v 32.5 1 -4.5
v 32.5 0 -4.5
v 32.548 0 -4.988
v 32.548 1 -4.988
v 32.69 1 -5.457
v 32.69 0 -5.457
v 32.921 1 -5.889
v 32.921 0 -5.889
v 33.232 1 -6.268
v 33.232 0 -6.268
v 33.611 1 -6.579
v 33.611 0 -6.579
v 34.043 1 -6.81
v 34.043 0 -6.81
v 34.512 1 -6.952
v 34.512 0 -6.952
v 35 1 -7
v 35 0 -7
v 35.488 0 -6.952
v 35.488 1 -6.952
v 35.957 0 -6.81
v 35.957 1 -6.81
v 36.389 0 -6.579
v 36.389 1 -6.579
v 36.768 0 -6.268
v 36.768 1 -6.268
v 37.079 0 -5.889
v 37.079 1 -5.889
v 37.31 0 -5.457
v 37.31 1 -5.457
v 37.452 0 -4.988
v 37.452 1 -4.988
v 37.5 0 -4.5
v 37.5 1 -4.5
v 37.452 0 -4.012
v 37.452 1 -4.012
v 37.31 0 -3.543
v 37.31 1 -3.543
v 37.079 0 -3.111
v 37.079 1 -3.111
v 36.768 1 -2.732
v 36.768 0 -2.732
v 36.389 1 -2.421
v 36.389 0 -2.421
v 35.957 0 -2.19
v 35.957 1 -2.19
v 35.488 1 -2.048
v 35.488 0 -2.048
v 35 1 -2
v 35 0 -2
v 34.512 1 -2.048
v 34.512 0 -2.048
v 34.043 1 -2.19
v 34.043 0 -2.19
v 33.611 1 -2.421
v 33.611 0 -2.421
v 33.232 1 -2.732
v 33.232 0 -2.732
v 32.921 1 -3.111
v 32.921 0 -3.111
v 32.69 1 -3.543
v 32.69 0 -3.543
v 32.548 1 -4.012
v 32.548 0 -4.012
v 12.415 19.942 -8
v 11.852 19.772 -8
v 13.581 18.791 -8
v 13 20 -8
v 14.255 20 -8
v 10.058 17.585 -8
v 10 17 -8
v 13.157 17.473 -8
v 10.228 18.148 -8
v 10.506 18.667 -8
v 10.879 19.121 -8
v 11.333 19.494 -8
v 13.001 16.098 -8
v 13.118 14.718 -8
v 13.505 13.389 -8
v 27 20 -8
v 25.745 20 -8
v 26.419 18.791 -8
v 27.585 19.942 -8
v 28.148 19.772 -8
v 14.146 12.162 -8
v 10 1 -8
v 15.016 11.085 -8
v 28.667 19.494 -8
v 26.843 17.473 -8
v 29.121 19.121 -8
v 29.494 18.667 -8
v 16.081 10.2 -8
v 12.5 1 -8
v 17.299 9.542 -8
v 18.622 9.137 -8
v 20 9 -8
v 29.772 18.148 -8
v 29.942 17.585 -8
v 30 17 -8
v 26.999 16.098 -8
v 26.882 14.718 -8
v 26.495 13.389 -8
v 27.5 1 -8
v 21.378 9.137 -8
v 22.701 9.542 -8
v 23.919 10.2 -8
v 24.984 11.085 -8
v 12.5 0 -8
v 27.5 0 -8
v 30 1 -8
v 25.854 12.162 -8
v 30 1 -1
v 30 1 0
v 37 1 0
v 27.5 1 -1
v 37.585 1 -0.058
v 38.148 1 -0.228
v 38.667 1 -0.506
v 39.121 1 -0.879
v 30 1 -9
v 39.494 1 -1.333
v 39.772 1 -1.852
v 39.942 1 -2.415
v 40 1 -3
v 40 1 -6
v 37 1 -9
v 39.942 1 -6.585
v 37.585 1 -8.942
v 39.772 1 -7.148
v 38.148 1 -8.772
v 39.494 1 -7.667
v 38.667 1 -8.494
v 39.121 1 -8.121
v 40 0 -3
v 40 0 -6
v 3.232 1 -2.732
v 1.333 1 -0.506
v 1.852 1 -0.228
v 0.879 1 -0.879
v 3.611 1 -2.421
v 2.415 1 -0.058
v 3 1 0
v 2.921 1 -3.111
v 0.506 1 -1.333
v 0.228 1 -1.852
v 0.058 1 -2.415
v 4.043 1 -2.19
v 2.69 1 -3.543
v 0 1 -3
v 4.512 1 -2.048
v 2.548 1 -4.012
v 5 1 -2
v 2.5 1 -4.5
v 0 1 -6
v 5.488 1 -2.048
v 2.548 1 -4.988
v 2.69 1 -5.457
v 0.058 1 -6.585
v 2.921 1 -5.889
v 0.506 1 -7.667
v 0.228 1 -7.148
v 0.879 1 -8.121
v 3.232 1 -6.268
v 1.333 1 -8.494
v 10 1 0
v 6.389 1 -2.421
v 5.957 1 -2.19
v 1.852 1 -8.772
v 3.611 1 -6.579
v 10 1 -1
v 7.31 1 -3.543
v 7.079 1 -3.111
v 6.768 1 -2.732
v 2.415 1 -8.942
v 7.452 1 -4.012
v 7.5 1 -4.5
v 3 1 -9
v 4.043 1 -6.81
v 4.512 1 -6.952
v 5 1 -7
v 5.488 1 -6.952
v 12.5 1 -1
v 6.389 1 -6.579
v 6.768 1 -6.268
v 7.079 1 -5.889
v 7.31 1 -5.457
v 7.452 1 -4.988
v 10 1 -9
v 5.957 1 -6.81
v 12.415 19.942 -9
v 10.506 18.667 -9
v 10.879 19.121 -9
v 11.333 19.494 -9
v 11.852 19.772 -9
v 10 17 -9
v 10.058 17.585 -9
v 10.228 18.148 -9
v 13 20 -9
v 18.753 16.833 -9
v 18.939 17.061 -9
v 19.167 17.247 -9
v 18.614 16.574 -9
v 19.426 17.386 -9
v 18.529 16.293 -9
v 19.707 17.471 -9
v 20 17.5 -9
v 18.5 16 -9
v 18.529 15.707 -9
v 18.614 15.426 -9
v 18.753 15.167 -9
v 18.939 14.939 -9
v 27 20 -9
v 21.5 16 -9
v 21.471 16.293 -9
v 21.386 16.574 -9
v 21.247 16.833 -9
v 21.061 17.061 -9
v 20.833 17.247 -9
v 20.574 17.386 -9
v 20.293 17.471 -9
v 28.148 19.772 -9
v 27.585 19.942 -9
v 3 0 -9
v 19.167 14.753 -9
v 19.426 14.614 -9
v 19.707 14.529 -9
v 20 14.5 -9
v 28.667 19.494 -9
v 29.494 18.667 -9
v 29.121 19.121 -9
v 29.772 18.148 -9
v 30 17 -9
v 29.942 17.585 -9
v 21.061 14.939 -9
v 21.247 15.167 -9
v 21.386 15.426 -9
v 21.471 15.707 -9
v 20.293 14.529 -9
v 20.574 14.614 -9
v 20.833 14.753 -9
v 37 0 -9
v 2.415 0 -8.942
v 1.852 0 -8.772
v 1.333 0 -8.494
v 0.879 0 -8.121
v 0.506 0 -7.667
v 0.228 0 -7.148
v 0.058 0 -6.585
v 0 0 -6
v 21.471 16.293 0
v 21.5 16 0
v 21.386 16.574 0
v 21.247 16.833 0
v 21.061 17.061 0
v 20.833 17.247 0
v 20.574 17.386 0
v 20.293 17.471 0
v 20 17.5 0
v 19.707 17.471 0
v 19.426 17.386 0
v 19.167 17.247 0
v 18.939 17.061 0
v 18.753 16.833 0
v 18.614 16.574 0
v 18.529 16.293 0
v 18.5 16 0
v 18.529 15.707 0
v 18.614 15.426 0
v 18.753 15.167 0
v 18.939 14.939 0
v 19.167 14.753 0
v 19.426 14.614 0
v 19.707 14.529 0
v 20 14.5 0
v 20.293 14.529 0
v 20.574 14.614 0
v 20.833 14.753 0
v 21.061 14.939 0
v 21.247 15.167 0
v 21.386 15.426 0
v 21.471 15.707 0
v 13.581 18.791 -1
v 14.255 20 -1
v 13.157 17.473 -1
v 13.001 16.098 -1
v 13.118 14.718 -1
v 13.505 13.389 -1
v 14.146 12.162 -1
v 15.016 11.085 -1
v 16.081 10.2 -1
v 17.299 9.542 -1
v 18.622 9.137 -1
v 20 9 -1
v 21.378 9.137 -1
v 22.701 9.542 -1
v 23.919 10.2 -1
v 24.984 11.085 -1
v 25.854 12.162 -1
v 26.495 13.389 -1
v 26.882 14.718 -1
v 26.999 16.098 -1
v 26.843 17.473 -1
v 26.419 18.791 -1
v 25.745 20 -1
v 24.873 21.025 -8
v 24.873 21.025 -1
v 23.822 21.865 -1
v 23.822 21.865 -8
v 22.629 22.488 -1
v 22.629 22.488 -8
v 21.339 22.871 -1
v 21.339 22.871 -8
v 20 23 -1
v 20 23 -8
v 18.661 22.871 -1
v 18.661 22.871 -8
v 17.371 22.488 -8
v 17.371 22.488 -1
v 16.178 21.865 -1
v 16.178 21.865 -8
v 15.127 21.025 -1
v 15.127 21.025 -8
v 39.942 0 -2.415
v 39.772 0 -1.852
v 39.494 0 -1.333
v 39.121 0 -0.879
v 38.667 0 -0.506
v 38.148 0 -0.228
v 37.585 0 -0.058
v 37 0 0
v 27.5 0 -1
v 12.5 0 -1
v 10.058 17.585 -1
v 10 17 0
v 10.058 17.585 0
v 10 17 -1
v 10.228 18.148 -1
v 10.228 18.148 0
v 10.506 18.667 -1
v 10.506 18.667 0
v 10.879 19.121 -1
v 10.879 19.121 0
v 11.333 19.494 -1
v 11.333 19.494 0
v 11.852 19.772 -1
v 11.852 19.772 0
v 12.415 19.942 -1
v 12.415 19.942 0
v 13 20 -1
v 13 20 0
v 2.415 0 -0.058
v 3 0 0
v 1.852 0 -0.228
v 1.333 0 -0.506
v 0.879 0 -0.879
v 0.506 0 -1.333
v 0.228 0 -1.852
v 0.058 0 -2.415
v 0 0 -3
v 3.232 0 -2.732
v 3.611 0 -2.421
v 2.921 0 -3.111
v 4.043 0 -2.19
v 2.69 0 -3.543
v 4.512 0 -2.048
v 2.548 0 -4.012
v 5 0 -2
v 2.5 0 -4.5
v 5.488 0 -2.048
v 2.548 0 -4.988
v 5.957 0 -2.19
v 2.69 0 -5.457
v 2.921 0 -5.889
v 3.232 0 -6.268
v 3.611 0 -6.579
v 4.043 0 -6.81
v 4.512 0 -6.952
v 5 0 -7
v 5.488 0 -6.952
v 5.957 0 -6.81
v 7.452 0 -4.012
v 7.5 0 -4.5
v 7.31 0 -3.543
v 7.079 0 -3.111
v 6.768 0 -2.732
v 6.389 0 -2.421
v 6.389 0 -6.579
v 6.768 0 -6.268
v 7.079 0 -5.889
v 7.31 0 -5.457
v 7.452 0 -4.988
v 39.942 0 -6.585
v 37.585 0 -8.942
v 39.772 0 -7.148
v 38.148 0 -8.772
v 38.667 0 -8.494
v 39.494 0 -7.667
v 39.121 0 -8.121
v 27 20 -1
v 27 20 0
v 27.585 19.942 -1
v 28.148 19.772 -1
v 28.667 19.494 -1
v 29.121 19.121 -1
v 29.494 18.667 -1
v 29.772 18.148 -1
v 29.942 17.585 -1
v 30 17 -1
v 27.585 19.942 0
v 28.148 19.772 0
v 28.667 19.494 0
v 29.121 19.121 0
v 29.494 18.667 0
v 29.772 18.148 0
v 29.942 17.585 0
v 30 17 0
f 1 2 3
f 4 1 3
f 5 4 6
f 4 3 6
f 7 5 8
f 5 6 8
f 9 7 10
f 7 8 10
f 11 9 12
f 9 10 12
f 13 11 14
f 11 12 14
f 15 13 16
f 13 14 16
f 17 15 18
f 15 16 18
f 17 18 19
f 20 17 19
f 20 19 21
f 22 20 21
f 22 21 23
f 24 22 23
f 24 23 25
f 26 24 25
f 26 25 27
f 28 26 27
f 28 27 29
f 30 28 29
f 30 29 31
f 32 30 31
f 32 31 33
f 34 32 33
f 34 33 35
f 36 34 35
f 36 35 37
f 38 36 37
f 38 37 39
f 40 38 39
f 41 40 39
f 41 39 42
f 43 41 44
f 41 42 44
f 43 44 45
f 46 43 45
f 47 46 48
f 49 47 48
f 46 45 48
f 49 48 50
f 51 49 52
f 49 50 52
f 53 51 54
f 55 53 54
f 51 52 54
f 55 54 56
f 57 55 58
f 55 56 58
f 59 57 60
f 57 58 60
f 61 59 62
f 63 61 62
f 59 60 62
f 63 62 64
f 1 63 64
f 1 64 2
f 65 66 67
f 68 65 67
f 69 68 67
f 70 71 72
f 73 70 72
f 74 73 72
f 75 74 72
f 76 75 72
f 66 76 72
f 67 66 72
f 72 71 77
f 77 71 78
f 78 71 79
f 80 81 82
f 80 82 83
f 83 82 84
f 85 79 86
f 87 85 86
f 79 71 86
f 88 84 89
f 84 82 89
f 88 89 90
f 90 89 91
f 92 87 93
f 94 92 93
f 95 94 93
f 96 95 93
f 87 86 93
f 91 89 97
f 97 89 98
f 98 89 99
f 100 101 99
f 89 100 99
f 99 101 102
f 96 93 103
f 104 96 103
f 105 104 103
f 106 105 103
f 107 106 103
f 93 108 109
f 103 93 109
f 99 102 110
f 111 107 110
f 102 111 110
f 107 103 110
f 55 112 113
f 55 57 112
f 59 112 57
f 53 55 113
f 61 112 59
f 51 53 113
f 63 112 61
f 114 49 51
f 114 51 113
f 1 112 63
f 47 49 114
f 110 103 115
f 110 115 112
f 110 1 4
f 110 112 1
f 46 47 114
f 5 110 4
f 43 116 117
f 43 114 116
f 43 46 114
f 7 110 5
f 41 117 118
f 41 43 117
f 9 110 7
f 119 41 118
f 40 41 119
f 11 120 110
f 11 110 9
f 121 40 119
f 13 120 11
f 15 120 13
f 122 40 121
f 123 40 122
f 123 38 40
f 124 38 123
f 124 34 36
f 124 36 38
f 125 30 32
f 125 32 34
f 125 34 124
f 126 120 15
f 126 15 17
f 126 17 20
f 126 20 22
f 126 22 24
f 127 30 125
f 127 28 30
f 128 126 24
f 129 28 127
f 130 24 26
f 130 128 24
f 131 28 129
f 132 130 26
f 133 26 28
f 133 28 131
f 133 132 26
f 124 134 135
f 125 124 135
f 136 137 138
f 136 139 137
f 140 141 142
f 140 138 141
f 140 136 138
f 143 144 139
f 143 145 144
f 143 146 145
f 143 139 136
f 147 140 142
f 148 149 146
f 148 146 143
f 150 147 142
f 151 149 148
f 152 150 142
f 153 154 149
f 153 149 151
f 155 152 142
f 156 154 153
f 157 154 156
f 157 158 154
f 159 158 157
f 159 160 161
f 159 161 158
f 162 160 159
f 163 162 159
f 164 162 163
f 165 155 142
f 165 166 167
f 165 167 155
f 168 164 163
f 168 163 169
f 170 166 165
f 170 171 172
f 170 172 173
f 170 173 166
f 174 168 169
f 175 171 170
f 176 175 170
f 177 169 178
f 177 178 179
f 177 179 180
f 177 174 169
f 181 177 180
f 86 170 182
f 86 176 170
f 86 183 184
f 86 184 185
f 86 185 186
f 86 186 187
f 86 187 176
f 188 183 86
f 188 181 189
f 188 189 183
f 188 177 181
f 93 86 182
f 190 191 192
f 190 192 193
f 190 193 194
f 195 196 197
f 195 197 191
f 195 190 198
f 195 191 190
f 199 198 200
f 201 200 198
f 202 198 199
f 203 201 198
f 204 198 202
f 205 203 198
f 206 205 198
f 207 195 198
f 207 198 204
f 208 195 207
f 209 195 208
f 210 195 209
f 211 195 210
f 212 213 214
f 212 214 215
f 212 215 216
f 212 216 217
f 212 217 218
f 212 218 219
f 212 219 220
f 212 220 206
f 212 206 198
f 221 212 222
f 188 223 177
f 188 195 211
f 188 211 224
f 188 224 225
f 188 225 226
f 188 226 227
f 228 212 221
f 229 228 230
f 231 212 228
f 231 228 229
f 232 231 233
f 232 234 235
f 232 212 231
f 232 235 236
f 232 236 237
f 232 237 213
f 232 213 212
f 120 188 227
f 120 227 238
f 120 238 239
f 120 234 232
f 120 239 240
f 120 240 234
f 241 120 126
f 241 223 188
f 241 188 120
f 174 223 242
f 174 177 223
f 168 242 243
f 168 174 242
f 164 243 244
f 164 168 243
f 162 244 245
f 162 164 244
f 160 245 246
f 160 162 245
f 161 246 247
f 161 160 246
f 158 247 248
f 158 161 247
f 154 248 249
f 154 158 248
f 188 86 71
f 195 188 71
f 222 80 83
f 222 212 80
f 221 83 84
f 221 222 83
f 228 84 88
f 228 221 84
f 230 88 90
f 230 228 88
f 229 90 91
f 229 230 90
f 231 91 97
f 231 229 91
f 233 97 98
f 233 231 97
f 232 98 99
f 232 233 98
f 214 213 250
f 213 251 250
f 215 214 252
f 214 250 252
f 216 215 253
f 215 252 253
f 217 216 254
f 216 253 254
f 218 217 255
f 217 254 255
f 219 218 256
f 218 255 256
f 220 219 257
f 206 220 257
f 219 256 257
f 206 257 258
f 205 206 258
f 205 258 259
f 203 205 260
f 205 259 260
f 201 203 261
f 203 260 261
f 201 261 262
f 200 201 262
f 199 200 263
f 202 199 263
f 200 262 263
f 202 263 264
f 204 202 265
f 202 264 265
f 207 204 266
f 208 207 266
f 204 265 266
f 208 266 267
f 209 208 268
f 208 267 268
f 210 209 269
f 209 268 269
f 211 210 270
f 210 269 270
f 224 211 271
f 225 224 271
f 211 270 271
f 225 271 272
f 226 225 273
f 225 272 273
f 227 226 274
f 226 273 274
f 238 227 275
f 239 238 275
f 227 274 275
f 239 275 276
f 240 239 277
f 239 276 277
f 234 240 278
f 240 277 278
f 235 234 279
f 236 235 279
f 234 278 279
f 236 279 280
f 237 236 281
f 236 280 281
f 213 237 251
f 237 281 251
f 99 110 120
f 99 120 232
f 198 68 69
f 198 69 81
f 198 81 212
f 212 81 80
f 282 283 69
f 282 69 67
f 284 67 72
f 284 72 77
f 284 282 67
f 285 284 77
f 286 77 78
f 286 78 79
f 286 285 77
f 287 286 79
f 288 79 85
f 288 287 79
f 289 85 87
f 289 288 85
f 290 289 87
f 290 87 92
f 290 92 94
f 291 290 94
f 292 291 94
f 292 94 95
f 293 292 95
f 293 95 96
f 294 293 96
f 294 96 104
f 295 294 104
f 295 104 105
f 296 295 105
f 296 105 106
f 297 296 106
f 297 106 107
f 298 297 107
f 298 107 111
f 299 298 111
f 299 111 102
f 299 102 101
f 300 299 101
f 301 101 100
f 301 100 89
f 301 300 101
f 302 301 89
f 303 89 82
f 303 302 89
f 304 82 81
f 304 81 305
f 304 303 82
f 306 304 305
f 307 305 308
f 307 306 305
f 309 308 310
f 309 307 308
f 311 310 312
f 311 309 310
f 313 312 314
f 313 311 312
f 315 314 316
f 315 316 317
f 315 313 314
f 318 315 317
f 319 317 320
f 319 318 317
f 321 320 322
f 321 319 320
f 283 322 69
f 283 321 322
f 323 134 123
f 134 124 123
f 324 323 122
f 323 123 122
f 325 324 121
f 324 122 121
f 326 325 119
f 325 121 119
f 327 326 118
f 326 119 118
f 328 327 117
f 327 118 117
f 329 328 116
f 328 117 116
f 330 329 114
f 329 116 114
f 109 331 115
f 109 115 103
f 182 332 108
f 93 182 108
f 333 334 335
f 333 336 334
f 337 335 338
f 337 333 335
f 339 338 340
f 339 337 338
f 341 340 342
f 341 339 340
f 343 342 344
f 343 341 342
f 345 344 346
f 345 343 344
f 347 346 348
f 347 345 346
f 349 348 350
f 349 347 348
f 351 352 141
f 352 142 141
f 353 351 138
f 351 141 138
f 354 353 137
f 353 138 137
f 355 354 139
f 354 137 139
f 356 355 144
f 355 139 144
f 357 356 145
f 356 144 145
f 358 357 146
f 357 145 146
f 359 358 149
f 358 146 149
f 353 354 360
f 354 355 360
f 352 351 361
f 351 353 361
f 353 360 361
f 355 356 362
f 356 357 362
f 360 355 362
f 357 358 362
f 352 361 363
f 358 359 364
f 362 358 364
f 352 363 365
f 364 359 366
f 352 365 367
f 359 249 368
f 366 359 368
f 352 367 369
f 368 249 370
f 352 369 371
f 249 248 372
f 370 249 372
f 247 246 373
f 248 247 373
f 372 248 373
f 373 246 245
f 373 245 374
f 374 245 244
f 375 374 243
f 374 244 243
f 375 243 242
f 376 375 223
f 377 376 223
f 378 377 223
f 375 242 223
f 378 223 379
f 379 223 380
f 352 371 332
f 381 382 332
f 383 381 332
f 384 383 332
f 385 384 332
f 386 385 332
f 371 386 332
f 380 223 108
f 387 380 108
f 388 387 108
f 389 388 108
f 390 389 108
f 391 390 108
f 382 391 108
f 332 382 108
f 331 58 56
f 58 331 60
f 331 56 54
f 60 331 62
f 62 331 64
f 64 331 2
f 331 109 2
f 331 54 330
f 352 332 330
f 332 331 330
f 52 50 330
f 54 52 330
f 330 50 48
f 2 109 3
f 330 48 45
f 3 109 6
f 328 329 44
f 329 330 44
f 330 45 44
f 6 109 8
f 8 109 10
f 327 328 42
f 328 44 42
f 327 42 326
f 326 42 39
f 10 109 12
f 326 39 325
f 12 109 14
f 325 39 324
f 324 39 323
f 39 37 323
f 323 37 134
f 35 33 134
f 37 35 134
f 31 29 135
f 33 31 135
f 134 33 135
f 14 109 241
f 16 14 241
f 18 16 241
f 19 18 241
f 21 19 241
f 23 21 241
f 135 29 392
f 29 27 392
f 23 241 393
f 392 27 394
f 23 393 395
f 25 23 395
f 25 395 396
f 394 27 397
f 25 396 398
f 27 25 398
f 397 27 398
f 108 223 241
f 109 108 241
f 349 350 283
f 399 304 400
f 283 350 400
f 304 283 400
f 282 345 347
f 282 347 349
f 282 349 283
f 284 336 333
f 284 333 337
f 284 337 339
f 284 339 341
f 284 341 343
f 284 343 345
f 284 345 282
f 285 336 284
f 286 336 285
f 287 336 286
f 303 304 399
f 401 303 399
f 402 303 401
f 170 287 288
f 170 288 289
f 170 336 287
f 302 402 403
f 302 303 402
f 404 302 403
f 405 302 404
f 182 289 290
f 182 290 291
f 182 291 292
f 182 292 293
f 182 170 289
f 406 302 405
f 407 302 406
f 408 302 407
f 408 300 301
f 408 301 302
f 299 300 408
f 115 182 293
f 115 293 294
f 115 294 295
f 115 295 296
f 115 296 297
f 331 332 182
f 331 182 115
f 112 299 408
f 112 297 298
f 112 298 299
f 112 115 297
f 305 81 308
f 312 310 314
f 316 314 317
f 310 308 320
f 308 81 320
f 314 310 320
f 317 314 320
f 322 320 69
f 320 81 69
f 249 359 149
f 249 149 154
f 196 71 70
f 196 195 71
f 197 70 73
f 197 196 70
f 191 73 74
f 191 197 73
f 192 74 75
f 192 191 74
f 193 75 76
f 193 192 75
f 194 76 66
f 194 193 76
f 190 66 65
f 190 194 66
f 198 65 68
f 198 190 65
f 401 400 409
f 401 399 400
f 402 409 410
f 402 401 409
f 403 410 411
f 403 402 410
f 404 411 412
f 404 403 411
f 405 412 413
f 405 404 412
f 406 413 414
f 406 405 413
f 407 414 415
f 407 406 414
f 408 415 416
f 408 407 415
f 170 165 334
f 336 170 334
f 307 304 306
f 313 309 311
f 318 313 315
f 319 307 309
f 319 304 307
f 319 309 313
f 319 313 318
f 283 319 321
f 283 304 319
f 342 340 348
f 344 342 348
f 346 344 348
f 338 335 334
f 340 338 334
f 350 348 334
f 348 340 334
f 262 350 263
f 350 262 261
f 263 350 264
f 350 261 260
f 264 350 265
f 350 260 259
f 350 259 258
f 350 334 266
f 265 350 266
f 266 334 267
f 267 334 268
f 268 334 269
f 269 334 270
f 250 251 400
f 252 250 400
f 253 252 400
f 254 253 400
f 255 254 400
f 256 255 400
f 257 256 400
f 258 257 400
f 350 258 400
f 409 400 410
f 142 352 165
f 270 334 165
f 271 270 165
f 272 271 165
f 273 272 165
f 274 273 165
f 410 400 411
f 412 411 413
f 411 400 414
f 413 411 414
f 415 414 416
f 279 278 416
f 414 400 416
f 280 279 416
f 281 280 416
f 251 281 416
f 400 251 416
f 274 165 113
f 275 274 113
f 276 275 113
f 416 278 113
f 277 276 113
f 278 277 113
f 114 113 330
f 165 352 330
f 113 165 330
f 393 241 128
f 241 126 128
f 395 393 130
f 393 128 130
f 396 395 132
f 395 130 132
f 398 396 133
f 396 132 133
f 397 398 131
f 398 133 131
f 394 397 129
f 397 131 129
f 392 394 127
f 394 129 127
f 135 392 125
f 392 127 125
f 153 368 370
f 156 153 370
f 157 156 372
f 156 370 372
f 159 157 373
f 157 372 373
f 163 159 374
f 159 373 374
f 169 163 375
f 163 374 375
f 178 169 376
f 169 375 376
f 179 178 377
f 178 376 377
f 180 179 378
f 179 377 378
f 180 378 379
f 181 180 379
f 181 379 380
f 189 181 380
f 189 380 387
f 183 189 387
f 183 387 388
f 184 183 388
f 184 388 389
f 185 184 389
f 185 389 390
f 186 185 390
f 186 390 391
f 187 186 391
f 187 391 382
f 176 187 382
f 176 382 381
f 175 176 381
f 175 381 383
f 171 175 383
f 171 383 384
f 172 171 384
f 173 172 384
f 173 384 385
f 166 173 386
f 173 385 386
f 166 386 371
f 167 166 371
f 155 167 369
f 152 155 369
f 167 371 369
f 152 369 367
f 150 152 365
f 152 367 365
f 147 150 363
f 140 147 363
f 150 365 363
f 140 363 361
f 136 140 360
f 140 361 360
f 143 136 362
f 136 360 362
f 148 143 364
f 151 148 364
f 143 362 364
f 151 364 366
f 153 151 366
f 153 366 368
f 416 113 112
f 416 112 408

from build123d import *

# Parameters (mm, degrees)
SKETCH_1_W                = 40
SKETCH_1_H                = 9
SKETCH_1_W_2              = 15
SKETCH_1_H_2              = 7
EXTRUDE_1_DEPTH           = 1
SKETCH_2_W                = 20
SKETCH_2_H                = 20
SKETCH_2_R                = 1.5
EXTRUDE_2_DEPTH           = 1
EXTRUDE_START             = -8
SKETCH_2_2_W              = 20
SKETCH_2_2_H              = 20
SKETCH_2_2_R              = 1.5
EXTRUDE_3_DEPTH           = 1
HOLE_WIZARD_5_0_5_1_D     = 5
HOLE_WIZARD_5_0_5_1_DEPTH = 6
EXTRUDE_START_2           = 7
SKETCH_5_R                = 7
SKETCH_5_R_2              = 1.5
EXTRUDE_4_DEPTH           = 7
FILLET_1_R                = 3


with BuildPart() as part:
    # 草图1 → 凸台-拉伸1 (new body)
    with BuildSketch(Plane(origin=(0, 0, 0), x_dir=(1, 0, 0), z_dir=(0, 1, 0))):
        with Locations((20, 4.5)):
            Rectangle(SKETCH_1_W, SKETCH_1_H)
        with Locations((20, 4.5)):
            Rectangle(SKETCH_1_W_2, SKETCH_1_H_2, mode=Mode.SUBTRACT)
    extrude(amount=EXTRUDE_1_DEPTH)

    # 草图2 → 凸台-拉伸2 (add)
    with BuildSketch(Plane.XY):
        with Locations((20, 10)):
            Rectangle(SKETCH_2_W, SKETCH_2_H)
        with Locations((20, 16)):
            Circle(SKETCH_2_R, mode=Mode.SUBTRACT)
    extrude(amount=-EXTRUDE_2_DEPTH)

    # 草图2<2> → 凸台-拉伸3 (add)
    with BuildSketch(Plane.XY.offset(EXTRUDE_START)):
        with Locations((20, 10)):
            Rectangle(SKETCH_2_2_W, SKETCH_2_2_H)
        with Locations((20, 16)):
            Circle(SKETCH_2_2_R, mode=Mode.SUBTRACT)
    extrude(amount=-EXTRUDE_3_DEPTH)

    # Ø5.0 (5) 直径孔1
    with Locations(Plane(origin=(0, 1, 0), x_dir=(1, 0, 0), z_dir=(0, 1, 0))):
        with Locations((35, 4.5), (5, 4.5)):
            Hole(HOLE_WIZARD_5_0_5_1_D / 2, depth=HOLE_WIZARD_5_0_5_1_DEPTH)

    # 草图5 → 凸台-拉伸4 (add)
    with BuildSketch(Plane.XY.offset(-8).offset(EXTRUDE_START_2)):
        with Locations(Location((20, 16, 0), (0, 0, 145.150095421))):
            Circle(SKETCH_5_R)
        with Locations((20, 16)):
            Circle(SKETCH_5_R_2, mode=Mode.SUBTRACT)
    extrude(amount=-EXTRUDE_4_DEPTH)

    # 圆角1
    fillet_1_edges = [part.edges().sort_by_distance(p)[0] for p in [
        (30, 20, -0.5),
        (10, 20, -0.5),
        (10, 20, -8.5),
        (30, 20, -8.5),
        (0, 0.5, -9),
        (40, 0.5, -9),
        (40, 0.5, 0),
        (0, 0.5, 0),
    ]]
    fillet(fillet_1_edges, radius=FILLET_1_R)


solid = part.part
